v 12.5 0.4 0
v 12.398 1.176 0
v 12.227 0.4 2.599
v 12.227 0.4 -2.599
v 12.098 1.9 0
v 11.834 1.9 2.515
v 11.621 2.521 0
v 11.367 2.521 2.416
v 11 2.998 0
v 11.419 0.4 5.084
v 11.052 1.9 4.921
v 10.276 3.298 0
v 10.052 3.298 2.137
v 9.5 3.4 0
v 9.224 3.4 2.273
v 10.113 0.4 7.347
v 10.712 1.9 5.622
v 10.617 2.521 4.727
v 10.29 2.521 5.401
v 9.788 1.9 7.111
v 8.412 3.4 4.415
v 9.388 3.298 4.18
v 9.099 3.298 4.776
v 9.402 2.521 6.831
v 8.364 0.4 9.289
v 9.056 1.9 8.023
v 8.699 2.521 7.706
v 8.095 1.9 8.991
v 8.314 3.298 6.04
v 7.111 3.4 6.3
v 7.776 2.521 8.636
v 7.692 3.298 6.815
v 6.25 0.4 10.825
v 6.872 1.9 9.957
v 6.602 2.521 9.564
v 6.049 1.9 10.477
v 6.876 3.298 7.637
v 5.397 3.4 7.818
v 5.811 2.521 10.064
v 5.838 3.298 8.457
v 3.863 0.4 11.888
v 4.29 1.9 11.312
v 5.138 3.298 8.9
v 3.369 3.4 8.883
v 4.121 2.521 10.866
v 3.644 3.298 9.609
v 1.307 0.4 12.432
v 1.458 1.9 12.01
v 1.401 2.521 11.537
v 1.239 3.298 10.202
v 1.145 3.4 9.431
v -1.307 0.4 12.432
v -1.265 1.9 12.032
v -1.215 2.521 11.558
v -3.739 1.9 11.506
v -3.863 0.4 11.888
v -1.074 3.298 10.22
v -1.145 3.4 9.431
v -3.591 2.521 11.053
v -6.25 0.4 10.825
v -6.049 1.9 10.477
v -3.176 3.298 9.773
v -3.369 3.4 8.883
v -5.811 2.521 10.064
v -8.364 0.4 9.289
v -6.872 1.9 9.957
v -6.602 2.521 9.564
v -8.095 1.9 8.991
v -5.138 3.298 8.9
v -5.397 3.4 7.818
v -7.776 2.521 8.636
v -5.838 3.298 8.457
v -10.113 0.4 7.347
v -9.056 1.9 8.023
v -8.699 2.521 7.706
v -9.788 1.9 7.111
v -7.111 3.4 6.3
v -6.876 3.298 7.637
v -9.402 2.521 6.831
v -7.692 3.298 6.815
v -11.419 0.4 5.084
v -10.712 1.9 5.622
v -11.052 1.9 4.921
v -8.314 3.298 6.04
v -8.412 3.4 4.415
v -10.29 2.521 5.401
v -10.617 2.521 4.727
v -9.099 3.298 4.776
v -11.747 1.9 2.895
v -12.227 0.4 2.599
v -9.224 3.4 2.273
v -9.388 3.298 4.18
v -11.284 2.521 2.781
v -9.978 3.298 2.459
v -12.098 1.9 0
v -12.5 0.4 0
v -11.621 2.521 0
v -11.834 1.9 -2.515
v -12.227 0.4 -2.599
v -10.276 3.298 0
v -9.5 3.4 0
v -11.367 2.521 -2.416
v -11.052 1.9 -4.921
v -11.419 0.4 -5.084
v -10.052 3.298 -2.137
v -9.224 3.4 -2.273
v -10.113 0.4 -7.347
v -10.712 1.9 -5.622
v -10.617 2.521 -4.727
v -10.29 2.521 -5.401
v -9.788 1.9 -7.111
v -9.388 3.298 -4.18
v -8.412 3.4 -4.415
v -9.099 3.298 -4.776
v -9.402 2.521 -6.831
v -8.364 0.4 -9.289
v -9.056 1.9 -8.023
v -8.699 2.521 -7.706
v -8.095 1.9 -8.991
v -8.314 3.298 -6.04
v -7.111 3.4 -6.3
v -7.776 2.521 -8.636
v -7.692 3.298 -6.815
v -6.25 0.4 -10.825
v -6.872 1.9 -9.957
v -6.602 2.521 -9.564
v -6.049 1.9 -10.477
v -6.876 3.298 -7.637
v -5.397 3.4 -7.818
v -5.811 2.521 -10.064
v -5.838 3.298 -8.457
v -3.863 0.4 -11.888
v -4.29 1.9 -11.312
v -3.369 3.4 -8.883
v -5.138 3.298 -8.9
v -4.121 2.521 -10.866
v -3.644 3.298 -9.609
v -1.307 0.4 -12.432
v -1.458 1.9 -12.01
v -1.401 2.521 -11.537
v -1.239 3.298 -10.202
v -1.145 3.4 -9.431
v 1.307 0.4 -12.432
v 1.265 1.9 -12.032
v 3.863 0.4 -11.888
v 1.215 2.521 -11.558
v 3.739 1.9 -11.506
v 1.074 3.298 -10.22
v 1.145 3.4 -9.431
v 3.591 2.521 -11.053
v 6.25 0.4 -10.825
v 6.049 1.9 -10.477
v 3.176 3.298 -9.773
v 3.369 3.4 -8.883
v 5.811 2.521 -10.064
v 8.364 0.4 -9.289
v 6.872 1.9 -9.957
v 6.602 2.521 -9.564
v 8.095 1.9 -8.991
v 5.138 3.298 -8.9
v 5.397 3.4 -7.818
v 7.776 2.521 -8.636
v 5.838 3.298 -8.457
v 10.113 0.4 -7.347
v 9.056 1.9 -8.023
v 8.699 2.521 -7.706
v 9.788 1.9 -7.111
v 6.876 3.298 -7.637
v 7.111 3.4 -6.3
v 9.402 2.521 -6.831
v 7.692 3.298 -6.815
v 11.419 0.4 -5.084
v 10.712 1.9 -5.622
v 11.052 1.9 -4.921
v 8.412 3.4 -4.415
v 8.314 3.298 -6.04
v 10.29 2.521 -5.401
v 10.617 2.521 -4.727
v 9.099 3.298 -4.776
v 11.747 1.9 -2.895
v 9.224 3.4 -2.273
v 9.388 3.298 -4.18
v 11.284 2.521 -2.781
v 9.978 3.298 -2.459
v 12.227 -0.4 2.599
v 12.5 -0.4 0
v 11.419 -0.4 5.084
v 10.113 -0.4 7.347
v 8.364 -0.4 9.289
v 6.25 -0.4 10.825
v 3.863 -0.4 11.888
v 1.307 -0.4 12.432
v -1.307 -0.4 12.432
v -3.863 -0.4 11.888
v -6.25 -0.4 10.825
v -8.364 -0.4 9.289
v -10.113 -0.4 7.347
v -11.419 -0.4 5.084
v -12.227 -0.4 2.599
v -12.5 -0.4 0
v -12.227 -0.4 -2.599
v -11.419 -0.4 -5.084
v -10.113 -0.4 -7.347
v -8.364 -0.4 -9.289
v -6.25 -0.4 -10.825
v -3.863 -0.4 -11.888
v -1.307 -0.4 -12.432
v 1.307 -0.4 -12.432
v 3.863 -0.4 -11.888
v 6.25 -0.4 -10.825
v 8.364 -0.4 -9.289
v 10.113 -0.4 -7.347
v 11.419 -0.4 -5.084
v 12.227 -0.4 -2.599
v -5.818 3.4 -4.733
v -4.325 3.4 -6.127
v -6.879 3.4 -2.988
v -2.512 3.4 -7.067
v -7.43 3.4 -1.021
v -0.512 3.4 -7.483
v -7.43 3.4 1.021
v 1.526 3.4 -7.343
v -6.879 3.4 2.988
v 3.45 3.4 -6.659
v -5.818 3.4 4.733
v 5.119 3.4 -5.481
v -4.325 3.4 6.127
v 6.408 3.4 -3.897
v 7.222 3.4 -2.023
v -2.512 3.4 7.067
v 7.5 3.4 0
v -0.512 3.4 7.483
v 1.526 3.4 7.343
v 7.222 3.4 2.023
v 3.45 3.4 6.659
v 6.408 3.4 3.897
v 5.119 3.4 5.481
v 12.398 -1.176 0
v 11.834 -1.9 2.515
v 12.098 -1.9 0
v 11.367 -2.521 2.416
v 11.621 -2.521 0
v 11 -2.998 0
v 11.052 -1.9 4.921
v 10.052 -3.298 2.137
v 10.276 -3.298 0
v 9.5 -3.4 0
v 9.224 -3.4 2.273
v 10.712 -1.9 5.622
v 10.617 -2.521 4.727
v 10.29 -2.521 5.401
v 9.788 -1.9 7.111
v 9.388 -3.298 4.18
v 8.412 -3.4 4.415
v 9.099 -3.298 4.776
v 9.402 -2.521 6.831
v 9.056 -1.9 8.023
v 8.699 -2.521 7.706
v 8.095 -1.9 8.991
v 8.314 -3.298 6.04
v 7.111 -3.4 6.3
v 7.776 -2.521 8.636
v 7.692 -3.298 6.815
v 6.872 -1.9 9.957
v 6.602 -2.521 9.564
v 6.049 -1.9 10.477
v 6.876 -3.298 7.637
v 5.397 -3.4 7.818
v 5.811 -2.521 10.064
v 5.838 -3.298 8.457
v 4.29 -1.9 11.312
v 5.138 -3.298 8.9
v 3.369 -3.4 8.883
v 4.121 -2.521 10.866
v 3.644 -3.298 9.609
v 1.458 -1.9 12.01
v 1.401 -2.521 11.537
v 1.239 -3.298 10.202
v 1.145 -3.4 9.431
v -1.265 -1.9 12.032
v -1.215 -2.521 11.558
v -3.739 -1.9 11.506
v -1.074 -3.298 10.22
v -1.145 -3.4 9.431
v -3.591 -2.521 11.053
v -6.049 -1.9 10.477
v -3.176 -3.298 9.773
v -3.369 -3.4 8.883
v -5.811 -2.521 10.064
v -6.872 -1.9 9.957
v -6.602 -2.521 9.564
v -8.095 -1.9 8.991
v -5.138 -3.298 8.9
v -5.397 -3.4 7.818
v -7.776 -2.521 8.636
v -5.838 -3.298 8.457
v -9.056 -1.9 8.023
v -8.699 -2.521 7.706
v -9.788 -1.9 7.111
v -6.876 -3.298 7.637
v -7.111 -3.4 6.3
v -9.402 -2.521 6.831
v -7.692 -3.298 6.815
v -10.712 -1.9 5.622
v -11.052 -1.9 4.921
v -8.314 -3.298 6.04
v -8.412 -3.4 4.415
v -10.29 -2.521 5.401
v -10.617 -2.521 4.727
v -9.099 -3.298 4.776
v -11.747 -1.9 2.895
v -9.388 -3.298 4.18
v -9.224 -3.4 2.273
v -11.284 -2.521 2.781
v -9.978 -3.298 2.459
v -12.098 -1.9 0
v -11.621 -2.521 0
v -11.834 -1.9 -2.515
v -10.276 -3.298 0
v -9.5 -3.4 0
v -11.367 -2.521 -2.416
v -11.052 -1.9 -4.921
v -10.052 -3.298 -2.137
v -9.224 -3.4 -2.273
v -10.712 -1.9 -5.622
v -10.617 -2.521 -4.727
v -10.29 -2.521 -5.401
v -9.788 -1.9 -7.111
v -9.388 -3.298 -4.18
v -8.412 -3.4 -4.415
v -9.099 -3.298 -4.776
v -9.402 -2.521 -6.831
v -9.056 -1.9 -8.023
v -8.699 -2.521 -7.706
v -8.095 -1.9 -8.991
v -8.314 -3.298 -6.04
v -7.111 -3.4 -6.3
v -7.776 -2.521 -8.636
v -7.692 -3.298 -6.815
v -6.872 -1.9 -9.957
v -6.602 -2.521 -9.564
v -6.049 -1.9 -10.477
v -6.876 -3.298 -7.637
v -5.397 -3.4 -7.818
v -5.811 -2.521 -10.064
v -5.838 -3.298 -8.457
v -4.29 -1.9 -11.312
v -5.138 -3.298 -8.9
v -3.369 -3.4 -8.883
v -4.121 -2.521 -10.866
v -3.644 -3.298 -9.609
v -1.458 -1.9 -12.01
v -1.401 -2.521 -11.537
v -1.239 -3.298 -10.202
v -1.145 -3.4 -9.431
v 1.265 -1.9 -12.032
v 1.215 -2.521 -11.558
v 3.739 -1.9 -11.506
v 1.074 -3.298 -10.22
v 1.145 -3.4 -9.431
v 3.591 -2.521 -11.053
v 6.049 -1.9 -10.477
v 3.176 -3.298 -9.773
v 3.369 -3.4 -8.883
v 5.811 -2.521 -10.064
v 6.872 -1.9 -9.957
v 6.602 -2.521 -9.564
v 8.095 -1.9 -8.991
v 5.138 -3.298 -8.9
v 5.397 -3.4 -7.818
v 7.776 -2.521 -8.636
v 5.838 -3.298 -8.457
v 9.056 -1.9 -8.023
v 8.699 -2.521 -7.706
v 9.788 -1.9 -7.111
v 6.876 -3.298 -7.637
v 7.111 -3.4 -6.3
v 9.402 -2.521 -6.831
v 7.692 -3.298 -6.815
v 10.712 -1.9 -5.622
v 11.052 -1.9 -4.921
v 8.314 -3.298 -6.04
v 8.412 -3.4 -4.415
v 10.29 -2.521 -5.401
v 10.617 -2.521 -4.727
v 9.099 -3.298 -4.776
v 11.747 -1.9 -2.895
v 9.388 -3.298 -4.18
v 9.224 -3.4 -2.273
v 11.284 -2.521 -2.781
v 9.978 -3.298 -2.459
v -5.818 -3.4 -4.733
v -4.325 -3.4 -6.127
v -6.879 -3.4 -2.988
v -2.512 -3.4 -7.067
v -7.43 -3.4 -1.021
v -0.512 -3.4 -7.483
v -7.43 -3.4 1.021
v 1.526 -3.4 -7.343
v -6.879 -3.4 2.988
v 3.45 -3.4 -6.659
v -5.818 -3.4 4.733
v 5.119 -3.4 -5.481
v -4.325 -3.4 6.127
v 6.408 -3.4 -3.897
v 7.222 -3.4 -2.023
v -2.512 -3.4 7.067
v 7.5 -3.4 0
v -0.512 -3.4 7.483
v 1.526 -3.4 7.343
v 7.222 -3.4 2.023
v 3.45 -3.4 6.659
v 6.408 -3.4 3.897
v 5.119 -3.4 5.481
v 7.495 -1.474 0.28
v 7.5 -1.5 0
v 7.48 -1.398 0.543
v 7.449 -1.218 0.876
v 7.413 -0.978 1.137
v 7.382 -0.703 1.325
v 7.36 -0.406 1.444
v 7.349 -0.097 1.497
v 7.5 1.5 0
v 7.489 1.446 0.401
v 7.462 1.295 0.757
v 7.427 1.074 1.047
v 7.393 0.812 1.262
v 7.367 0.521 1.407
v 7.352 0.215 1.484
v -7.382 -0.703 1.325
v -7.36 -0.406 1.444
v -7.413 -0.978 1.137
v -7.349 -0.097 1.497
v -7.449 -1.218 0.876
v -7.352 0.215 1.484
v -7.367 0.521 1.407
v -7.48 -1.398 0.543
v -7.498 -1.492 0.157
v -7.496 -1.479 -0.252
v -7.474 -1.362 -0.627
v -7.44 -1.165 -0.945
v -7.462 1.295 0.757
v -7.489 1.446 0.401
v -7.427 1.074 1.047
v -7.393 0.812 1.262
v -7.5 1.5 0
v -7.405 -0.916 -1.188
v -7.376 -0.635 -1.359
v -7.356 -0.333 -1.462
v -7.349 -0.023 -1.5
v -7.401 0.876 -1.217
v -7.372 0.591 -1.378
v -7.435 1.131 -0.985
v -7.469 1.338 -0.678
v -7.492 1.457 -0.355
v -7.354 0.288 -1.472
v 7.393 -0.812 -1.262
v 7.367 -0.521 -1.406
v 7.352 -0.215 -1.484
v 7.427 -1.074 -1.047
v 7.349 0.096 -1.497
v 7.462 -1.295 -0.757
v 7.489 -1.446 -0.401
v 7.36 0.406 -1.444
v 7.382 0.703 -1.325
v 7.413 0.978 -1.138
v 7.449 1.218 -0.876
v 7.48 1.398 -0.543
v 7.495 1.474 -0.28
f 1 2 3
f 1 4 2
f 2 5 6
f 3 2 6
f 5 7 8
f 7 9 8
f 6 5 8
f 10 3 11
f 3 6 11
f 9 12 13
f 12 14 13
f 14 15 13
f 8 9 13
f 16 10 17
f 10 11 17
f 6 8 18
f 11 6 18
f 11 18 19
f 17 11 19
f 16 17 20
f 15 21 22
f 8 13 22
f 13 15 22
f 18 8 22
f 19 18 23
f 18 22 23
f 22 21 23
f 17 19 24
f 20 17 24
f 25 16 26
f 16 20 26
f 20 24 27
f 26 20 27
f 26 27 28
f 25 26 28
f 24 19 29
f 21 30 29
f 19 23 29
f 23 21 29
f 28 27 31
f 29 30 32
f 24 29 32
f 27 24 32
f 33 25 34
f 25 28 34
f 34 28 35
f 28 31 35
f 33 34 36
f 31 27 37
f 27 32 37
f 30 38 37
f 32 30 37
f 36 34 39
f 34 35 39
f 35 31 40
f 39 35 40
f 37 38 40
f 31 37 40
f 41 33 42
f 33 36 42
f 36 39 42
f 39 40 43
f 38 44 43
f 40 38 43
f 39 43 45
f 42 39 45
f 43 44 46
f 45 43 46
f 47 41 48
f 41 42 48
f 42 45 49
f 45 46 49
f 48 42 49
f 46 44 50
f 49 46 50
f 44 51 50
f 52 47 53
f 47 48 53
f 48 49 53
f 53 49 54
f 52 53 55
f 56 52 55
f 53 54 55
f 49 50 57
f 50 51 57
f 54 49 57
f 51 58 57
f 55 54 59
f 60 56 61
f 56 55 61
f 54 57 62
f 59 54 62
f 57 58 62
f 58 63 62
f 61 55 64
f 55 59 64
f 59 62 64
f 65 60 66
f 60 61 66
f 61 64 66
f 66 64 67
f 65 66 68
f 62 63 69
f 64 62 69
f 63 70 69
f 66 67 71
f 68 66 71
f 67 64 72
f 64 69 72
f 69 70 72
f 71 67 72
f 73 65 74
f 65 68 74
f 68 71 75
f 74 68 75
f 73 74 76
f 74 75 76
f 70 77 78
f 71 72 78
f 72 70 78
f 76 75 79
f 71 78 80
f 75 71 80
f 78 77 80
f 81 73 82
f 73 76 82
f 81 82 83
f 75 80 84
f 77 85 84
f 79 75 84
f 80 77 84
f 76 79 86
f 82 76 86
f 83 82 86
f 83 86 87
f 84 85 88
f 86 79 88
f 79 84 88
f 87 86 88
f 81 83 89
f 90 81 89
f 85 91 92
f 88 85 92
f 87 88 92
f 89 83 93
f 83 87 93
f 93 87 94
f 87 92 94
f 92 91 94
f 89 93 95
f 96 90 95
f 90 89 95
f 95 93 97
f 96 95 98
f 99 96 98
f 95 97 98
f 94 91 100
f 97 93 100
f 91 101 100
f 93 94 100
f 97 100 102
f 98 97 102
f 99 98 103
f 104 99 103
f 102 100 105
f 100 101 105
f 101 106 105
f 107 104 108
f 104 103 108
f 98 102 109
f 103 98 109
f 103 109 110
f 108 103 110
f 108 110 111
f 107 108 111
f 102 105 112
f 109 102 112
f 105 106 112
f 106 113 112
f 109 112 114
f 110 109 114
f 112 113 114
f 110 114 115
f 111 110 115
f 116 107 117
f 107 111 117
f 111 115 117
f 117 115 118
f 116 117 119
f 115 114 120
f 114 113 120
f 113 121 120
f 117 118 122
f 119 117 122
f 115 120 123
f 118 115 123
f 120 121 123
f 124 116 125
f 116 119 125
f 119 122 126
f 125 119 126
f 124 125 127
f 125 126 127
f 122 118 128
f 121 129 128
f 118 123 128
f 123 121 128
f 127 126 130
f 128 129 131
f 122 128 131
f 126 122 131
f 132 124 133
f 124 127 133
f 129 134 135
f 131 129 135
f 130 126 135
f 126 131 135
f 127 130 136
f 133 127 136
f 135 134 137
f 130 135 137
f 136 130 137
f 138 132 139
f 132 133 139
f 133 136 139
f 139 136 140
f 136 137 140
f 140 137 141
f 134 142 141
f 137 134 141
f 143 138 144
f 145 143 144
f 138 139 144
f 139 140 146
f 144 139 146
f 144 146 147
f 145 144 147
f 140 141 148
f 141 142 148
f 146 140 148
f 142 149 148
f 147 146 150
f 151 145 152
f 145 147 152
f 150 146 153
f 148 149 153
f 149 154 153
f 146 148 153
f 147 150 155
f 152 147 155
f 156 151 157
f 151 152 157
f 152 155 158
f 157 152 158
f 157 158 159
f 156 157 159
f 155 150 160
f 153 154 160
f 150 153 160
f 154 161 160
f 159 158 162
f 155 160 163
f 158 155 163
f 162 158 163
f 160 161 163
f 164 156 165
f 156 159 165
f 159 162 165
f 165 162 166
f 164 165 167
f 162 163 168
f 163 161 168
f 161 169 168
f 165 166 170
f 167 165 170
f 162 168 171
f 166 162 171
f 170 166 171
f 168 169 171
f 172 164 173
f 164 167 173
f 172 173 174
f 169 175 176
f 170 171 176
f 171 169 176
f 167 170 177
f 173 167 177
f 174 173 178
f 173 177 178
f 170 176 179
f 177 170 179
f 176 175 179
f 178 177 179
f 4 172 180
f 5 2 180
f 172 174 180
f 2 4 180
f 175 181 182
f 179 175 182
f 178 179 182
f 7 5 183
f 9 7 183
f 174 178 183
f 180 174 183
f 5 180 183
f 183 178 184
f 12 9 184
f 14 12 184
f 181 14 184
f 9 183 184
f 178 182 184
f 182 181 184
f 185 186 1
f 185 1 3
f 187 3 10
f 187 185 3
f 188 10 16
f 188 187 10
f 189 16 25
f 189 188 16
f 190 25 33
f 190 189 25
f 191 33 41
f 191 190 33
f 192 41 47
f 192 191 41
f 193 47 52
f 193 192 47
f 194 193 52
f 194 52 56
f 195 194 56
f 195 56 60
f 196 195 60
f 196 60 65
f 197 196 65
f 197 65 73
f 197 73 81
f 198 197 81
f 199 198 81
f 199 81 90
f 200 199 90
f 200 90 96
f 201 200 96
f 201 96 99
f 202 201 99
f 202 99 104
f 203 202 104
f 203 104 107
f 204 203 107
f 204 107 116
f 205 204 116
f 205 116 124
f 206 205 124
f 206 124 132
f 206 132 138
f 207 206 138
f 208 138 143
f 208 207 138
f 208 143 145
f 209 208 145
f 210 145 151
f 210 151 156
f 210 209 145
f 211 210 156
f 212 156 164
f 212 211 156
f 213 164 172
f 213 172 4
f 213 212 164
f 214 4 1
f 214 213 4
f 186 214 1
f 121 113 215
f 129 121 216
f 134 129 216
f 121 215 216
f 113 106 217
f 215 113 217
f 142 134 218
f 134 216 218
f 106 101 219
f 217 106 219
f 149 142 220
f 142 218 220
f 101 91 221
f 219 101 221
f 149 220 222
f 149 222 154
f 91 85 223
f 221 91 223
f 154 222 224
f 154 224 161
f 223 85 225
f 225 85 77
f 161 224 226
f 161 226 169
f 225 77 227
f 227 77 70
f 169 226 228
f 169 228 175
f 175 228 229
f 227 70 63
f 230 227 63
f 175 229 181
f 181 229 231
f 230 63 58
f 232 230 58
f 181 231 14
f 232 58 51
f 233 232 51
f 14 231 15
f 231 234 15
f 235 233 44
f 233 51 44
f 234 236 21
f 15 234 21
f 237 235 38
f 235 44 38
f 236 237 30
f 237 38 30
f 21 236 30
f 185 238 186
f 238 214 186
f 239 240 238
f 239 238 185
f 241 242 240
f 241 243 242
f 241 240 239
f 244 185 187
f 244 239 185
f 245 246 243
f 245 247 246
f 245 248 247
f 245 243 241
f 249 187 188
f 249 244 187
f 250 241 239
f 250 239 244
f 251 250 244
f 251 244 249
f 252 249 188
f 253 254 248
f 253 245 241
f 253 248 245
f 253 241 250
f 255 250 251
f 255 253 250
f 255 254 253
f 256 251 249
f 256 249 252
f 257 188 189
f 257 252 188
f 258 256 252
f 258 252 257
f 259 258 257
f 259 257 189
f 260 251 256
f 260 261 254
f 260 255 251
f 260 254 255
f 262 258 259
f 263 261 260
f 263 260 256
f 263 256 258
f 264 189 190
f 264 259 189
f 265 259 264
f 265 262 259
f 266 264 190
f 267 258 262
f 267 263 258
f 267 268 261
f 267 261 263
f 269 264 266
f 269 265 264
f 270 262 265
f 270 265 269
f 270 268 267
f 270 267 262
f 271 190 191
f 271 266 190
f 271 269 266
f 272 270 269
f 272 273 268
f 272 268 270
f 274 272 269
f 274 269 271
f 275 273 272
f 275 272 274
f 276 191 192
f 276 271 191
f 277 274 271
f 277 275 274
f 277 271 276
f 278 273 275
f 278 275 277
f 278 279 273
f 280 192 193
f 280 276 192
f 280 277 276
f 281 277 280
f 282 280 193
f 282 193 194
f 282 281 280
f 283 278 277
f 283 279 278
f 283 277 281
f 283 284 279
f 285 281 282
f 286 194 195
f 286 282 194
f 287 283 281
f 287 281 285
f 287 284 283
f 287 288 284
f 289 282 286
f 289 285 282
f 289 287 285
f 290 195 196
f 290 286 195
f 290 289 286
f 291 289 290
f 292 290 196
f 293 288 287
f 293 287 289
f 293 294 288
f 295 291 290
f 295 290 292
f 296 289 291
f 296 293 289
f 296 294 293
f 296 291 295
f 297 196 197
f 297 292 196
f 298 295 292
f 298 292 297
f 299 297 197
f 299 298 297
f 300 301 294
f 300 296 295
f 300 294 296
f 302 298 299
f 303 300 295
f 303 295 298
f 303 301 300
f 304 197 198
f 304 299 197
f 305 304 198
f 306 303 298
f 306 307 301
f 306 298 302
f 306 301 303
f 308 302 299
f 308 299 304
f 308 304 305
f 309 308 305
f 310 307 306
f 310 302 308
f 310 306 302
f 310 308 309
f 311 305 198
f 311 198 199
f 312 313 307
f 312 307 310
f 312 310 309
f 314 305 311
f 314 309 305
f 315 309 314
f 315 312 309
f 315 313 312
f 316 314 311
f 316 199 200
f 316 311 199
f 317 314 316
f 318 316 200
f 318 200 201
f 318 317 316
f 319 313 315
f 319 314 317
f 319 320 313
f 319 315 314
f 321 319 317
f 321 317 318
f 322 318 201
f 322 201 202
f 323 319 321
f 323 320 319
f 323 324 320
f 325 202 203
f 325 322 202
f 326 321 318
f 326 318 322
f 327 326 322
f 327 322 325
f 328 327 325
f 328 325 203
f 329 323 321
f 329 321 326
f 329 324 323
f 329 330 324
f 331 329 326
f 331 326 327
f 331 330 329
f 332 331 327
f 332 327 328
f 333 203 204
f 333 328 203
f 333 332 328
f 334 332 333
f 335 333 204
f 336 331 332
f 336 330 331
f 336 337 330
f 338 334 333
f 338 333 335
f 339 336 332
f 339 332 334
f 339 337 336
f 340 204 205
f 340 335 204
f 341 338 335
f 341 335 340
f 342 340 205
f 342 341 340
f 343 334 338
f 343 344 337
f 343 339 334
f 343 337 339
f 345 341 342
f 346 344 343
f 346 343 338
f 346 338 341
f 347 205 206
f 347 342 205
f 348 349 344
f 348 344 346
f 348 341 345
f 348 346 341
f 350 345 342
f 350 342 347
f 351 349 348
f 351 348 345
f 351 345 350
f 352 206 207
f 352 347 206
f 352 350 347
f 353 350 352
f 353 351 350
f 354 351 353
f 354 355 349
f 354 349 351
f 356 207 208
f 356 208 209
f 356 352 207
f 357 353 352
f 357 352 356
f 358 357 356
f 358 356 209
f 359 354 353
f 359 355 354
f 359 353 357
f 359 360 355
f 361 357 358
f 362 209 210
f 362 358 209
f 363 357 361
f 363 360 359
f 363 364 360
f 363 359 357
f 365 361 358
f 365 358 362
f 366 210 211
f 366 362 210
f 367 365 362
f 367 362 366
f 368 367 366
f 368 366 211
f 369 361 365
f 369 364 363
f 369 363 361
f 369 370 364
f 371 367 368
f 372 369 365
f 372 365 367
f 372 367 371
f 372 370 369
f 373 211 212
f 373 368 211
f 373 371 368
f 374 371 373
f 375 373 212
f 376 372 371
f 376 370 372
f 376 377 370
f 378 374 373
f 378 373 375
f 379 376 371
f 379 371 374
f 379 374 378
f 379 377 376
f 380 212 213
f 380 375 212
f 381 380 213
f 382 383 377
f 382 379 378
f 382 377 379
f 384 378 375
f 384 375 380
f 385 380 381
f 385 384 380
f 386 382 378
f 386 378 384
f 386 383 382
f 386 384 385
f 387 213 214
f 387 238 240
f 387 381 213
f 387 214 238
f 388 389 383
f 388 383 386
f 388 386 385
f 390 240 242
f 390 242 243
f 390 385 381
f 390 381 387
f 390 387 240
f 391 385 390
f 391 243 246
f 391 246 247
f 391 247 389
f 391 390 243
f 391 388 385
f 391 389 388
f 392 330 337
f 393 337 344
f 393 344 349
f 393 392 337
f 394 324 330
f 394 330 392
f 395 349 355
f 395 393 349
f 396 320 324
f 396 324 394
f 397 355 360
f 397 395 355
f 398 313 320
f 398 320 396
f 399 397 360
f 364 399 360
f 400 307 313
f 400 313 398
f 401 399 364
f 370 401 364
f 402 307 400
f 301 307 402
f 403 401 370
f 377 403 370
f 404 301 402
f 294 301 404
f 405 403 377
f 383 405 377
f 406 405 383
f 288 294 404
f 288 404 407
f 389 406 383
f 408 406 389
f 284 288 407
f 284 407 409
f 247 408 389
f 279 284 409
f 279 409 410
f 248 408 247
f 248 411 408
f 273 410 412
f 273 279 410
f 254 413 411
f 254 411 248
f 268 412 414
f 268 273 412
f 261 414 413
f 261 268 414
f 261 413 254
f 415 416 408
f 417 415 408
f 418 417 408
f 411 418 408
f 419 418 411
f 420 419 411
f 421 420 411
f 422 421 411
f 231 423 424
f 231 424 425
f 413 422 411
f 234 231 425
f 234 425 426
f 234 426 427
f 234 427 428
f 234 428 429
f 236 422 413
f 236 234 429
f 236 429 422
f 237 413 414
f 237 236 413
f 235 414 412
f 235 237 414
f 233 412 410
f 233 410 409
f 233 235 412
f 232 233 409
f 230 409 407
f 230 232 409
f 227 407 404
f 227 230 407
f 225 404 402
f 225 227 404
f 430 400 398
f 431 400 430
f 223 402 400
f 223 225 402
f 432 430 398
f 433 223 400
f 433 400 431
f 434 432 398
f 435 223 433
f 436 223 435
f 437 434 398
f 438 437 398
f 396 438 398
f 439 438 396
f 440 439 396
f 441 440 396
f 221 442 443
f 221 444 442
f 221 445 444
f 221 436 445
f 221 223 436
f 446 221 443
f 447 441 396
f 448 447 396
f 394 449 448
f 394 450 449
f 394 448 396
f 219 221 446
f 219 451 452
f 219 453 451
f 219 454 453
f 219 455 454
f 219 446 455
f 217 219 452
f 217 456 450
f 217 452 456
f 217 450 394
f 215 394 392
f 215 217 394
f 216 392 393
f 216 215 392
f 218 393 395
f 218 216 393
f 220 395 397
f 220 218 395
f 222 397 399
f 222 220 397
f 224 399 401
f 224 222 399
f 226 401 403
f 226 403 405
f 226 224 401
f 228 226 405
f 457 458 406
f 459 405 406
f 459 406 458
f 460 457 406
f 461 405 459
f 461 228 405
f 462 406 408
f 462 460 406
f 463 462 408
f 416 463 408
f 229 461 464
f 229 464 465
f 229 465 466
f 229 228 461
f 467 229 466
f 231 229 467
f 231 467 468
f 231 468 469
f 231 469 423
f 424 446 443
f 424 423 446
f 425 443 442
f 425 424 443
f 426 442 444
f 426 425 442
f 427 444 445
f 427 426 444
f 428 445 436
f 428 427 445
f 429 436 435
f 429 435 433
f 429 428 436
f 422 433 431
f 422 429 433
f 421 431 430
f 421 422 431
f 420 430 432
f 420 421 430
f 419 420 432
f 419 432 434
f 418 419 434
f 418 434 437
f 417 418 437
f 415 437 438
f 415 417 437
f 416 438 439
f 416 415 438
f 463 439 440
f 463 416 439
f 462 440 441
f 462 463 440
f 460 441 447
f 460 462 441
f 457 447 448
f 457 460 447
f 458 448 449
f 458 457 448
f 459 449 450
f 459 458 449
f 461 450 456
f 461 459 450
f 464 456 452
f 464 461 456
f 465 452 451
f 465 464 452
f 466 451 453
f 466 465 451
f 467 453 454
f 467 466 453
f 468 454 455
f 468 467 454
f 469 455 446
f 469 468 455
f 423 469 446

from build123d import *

# Parameters (mm, degrees)
F0_R     = 12.5
F0_R_2   = 7.5
F1_DEPTH = 3.4
F2_R     = 3
F4_R     = 1.5
F5_DEPTH = 10


# Not quite as in the source:
# - the program builds the solid bodies; features that only make, move or delete a surface that nothing else refers to are left out


with BuildPart() as f1:
    # F0 (on Front) → F1 (new body, symmetric)
    with BuildSketch(Plane.XZ):
        Circle(F0_R)
        Circle(F0_R_2, mode=Mode.SUBTRACT)
    extrude(amount=F1_DEPTH, both=True)

    # F2
    f2_edges = [f1.edges().sort_by_distance(p)[0] for p in [
        (-12.5, 3.4, 0),
        (-12.5, -3.4, 0),
    ]]
    fillet(f2_edges, radius=F2_R)

    # F4 (on Right) → F5 (join, symmetric)
    with BuildSketch(Plane.YZ):
        Circle(F4_R)
    extrude(amount=F5_DEPTH, both=True)


solid = f1.part
